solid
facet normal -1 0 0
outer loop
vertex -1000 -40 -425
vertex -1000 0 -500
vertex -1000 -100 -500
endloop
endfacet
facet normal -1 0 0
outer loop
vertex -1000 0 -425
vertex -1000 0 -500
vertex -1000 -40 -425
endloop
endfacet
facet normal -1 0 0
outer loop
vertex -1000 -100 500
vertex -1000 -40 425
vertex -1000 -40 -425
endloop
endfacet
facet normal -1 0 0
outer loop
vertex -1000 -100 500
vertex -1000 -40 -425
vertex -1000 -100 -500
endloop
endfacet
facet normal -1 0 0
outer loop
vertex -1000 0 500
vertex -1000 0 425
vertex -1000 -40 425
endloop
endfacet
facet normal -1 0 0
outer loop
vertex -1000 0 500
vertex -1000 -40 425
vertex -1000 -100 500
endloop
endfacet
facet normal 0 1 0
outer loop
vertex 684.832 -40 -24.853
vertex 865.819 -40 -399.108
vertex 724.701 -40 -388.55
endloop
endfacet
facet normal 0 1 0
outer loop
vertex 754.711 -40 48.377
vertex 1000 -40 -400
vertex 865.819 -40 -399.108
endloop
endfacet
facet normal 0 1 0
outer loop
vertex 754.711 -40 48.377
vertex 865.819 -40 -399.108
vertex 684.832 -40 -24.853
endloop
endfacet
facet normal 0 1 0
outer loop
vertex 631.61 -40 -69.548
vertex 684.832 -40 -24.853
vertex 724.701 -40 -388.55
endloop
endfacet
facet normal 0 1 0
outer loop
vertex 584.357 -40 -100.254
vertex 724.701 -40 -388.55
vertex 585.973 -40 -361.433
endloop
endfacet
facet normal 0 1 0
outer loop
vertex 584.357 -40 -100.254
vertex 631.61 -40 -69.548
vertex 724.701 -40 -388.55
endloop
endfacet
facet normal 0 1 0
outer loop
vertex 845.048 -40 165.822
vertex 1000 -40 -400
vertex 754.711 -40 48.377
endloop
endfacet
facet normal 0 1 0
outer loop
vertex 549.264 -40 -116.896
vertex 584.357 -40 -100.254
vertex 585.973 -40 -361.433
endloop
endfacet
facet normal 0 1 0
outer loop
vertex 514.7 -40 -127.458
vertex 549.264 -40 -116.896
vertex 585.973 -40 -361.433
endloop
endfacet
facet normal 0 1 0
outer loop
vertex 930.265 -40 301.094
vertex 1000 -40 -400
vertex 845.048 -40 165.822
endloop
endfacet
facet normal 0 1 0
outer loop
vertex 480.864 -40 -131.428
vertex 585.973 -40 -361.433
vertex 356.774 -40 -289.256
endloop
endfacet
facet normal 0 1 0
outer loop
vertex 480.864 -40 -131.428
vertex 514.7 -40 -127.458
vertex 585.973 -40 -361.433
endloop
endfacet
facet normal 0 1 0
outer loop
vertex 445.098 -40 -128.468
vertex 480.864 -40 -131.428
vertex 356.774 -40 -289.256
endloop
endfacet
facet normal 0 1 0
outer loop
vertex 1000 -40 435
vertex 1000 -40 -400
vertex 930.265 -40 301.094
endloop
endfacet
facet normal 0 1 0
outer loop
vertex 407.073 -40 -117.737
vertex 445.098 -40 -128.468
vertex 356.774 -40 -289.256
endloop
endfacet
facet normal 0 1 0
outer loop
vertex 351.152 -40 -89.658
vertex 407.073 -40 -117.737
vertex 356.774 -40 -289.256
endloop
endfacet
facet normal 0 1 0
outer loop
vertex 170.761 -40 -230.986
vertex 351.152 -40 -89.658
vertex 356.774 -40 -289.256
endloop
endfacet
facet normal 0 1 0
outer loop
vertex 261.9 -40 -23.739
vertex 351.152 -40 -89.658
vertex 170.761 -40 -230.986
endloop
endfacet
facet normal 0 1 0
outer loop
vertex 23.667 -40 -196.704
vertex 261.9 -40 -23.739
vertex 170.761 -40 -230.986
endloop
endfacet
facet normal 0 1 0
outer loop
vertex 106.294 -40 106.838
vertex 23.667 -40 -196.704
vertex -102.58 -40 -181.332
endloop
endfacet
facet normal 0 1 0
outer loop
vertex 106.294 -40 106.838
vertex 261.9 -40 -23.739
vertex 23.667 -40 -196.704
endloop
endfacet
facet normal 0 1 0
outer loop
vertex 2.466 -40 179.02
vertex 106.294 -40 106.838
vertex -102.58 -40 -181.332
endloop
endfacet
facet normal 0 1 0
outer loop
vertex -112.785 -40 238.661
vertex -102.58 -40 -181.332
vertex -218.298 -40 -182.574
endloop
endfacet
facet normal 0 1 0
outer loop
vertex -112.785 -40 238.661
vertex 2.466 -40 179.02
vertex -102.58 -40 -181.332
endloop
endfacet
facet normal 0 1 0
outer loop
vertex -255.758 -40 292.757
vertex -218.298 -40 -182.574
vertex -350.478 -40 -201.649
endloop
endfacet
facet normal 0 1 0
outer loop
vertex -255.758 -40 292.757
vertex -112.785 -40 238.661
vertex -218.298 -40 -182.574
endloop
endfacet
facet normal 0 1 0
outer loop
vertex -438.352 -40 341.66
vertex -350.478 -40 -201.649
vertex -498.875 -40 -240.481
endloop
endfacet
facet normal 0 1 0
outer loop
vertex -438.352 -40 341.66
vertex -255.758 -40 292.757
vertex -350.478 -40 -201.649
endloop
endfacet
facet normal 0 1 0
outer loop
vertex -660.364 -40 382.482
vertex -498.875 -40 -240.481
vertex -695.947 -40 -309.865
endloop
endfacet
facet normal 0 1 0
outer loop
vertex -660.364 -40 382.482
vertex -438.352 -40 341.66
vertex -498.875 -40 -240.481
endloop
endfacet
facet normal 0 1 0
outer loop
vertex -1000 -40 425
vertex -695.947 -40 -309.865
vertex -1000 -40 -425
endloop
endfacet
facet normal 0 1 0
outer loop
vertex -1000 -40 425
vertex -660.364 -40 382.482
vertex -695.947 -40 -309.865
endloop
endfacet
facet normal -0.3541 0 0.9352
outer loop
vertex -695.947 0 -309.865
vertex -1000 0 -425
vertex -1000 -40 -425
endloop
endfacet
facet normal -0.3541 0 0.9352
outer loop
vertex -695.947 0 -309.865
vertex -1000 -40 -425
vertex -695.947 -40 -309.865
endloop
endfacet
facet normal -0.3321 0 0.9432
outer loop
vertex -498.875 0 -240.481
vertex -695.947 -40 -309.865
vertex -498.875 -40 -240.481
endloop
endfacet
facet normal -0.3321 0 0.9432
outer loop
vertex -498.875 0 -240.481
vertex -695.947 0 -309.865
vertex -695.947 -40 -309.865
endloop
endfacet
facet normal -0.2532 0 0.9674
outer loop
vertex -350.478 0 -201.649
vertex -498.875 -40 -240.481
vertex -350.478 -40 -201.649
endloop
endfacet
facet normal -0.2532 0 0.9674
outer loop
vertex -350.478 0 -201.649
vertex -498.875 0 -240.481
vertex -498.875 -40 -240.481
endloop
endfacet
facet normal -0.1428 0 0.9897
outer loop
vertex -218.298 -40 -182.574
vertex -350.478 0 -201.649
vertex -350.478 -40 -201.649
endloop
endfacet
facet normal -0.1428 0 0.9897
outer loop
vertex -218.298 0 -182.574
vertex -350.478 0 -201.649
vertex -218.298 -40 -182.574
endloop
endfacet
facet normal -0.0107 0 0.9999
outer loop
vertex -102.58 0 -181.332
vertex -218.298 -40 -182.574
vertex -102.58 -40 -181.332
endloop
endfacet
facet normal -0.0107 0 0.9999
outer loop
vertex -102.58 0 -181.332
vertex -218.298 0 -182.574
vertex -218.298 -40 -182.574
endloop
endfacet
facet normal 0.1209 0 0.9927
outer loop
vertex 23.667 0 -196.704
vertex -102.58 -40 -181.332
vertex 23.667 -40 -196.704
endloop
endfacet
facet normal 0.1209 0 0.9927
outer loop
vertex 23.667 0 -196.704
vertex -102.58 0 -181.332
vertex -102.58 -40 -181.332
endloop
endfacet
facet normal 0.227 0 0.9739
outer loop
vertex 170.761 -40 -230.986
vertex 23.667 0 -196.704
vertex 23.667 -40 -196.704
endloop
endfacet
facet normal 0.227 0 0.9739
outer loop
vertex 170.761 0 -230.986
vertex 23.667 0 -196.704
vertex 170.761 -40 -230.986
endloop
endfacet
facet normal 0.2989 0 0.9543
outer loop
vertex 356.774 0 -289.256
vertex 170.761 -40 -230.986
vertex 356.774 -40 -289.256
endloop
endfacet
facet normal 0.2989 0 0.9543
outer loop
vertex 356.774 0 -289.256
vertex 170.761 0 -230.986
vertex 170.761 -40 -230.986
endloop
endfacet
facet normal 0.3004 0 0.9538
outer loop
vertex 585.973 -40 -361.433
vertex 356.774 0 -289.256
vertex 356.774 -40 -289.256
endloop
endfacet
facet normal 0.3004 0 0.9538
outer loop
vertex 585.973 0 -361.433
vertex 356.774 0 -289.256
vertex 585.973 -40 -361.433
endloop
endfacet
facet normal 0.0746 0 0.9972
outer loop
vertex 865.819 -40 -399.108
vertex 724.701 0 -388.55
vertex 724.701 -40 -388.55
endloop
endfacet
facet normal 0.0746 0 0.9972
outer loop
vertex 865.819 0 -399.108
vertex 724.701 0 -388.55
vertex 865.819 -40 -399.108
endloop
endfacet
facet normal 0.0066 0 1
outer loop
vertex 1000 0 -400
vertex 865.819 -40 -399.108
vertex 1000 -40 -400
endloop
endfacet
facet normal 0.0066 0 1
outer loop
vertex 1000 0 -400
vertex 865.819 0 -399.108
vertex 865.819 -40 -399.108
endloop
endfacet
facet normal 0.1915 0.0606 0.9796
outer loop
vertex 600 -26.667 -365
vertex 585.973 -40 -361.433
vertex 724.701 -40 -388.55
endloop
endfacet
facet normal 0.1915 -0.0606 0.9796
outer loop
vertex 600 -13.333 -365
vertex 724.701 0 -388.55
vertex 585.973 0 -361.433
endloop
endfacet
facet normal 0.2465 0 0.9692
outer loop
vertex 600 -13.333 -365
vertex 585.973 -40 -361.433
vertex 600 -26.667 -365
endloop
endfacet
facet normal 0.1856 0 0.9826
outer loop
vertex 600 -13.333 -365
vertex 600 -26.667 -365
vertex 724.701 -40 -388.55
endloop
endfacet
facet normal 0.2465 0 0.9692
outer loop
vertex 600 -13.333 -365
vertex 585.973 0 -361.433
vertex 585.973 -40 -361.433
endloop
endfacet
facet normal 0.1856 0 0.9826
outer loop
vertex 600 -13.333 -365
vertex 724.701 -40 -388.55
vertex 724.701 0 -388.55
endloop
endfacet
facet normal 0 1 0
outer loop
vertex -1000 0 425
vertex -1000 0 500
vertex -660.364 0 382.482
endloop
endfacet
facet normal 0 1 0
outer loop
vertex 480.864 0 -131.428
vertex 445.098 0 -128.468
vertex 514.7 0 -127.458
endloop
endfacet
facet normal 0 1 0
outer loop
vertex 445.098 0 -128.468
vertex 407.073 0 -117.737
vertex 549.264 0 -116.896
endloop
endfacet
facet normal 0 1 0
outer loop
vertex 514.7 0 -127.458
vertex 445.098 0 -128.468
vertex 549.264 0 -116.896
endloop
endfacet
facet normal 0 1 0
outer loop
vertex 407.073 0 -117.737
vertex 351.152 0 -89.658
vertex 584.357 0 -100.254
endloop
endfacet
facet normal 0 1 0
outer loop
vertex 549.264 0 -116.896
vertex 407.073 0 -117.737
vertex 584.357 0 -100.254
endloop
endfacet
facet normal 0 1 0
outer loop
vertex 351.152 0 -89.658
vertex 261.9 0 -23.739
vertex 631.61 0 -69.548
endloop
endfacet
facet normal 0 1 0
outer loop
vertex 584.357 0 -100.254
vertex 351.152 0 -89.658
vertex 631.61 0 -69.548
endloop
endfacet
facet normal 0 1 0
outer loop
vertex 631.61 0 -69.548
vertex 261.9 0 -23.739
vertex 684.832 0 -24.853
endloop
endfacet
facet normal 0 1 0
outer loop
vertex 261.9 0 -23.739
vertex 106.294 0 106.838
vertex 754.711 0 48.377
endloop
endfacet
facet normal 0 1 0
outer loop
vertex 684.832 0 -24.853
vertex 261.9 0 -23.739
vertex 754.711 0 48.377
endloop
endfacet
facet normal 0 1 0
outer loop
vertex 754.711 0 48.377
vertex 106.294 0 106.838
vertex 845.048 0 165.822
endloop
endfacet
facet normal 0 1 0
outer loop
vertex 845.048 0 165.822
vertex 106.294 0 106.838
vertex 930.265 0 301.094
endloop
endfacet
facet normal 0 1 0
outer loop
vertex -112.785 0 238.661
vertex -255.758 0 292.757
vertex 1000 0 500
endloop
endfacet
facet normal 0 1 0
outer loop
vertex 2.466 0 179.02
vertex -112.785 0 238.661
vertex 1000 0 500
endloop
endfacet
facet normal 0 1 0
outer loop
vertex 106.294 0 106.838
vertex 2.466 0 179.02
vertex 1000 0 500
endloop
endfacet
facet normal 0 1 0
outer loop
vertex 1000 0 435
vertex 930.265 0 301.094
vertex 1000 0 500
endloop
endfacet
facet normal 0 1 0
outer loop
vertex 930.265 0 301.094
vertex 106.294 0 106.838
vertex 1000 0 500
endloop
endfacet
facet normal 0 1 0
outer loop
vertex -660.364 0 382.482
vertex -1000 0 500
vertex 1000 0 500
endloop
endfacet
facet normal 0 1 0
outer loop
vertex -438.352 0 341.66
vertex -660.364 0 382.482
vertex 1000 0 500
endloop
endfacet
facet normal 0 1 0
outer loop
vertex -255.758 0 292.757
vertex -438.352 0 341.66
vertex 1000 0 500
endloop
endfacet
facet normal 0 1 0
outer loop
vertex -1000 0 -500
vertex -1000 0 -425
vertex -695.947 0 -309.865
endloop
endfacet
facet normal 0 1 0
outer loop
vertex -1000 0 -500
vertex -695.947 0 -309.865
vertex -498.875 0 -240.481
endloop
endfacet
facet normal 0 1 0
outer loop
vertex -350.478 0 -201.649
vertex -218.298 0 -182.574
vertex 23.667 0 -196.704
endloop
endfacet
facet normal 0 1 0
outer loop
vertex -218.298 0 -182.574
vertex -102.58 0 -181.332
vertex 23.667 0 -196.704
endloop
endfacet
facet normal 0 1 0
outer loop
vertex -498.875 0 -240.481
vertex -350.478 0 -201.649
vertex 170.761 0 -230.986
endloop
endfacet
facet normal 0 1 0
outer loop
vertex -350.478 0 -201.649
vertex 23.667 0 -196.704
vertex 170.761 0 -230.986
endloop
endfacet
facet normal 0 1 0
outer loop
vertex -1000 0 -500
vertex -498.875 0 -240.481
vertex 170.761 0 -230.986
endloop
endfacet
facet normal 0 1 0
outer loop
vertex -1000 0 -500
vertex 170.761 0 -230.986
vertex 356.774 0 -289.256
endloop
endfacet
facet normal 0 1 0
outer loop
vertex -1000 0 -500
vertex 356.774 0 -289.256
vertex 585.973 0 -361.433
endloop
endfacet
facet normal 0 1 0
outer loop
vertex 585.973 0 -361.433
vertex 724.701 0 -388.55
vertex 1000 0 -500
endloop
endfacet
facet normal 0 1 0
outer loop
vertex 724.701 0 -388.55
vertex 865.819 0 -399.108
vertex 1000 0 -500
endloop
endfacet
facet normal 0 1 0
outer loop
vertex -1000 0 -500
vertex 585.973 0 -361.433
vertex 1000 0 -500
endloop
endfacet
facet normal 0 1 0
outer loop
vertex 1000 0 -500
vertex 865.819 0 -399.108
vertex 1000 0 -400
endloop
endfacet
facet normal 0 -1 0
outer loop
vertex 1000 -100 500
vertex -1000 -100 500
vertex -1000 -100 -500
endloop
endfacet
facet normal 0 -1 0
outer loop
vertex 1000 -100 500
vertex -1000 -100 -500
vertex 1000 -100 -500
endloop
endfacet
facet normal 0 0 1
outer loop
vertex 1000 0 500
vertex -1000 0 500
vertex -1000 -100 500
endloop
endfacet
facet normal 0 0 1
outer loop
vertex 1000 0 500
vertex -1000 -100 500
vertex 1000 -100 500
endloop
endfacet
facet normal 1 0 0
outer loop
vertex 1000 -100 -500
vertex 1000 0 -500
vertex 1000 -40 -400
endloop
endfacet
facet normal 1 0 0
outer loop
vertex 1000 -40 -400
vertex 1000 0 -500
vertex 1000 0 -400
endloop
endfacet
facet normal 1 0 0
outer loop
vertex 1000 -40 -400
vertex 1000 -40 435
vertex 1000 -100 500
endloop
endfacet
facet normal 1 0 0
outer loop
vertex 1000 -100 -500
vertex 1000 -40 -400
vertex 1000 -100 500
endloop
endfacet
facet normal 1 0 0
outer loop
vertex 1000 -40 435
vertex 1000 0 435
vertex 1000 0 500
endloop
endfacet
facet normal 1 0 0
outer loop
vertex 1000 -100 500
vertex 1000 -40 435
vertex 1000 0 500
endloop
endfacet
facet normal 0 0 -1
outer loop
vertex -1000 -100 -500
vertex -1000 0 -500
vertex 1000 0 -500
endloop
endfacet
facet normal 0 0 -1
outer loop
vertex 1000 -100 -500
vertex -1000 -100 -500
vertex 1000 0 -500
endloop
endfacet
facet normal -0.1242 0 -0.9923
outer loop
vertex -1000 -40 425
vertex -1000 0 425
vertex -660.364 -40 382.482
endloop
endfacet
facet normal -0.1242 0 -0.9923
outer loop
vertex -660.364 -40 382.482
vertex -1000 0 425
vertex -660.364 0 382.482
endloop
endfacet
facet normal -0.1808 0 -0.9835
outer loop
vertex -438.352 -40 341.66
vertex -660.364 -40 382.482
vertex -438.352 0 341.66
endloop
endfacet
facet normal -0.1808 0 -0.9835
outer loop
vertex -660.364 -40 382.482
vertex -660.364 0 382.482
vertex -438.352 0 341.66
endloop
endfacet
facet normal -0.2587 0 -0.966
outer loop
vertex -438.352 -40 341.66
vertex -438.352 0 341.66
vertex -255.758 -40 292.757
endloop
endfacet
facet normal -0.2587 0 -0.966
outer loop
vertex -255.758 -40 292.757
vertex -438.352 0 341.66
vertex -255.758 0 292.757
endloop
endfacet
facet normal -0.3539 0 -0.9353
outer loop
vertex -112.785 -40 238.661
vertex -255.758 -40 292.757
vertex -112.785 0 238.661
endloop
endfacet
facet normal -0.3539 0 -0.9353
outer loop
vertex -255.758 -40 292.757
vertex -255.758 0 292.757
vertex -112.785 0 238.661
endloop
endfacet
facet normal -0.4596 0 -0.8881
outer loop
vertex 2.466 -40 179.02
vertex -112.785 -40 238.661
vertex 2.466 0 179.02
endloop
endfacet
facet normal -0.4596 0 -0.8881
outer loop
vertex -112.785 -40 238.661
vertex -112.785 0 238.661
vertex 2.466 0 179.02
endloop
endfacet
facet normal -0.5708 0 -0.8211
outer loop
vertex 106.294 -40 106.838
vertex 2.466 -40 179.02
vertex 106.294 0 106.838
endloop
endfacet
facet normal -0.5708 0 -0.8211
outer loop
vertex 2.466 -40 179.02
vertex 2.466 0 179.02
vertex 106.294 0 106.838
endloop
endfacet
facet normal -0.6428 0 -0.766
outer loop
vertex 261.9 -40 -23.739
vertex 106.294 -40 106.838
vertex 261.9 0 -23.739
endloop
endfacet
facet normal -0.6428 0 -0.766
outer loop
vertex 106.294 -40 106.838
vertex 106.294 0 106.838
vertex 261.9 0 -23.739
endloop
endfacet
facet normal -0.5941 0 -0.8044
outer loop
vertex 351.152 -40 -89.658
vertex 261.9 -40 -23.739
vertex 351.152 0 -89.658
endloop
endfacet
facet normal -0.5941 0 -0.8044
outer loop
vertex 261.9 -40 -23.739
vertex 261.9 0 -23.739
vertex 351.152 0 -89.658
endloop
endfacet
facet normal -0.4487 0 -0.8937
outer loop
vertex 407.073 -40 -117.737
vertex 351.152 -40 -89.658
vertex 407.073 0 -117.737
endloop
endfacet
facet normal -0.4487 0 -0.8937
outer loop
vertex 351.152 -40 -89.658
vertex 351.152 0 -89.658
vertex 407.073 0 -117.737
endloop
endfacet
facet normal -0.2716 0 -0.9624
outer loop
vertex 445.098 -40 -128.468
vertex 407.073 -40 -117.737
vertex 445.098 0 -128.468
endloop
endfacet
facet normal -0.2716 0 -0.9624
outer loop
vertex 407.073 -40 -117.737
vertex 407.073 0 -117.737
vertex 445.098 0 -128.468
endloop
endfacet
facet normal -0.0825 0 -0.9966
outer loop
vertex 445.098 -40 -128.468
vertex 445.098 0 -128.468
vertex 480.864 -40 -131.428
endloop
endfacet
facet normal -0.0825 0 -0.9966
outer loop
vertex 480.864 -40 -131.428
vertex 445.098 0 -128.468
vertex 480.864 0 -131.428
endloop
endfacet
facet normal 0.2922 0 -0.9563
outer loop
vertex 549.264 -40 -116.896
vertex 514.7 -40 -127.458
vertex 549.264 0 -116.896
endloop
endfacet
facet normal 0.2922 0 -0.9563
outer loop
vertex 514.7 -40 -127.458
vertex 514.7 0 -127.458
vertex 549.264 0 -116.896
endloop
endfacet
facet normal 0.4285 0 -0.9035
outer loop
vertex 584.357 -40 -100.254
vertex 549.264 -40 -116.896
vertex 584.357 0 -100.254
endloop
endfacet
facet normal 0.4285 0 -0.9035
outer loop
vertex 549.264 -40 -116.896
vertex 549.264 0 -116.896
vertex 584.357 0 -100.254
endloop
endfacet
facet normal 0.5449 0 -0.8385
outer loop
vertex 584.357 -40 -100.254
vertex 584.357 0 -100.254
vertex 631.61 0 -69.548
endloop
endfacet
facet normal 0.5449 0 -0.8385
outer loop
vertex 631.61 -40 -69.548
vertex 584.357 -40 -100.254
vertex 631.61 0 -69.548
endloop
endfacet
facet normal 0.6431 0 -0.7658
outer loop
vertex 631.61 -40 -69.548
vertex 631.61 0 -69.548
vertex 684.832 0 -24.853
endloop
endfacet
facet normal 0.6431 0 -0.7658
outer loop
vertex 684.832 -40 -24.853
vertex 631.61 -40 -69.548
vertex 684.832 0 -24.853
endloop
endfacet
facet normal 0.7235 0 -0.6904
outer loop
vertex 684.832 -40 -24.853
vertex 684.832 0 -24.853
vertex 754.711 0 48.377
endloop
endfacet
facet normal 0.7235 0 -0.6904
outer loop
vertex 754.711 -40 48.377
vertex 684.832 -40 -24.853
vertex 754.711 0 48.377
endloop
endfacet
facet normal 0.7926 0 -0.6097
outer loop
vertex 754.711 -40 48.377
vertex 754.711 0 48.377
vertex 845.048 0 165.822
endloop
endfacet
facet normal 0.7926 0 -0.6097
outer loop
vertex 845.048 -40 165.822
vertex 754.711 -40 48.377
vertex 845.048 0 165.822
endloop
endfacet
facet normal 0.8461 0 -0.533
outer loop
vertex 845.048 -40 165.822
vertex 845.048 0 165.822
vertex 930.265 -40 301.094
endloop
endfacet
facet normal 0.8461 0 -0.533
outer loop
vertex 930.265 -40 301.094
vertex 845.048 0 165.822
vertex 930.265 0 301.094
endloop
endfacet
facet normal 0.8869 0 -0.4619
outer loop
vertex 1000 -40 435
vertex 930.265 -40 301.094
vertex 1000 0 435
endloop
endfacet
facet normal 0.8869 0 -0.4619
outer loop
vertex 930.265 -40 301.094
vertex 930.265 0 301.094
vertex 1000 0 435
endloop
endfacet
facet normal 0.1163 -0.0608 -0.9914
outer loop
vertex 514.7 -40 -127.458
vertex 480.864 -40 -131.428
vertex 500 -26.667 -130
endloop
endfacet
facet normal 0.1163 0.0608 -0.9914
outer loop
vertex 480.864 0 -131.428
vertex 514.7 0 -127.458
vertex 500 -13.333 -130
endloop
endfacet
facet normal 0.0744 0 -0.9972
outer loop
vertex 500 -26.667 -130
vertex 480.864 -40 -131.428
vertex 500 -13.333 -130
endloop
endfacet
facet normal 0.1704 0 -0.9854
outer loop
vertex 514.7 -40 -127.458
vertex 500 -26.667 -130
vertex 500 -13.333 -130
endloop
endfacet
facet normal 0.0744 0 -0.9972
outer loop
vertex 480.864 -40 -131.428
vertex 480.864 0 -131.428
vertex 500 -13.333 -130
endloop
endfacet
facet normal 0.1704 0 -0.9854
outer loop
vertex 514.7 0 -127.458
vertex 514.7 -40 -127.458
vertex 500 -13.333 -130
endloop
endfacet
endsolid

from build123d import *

# Parameters (mm, degrees)
F0_W     = 2000
F0_H     = 1000
F1_DEPTH = 100
F3_DEPTH = 40


with BuildPart() as f1:
    # F0 (on Front) → F1 (new body)
    with BuildSketch(Plane.XZ):
        Rectangle(F0_W, F0_H)
    extrude(amount=F1_DEPTH)

    # F2 (on face) → F3 (cut)
    with BuildSketch(Plane.XZ):
        with BuildLine():
            add(Edge.make_bspline(
                [(-1000, 425), (-635, 385), (43.6282540949, 301.6068419822), (495.2080240683, -370.8591927127), (890, 200), (1000, 435)],
                knots=[0, 0, 0, 0, 0.3888271221, 0.6715681678, 1, 1, 1, 1], degree=3))
            Line((-1000, 425), (-1000, -425))
            add(Edge.make_bspline(
                [(-1000, -425), (-700, -320), (-168.1292405703, -43.4213137635), (583.948307454, -406.7247177632), (875, -400), (1000, -400)],
                knots=[0, 0, 0, 0, 0.3855526607, 0.7416430137, 1, 1, 1, 1], degree=3))
            Line((1000, -400), (1000, 435))
        make_face()
    extrude(amount=F3_DEPTH, mode=Mode.SUBTRACT)


solid = f1.part
